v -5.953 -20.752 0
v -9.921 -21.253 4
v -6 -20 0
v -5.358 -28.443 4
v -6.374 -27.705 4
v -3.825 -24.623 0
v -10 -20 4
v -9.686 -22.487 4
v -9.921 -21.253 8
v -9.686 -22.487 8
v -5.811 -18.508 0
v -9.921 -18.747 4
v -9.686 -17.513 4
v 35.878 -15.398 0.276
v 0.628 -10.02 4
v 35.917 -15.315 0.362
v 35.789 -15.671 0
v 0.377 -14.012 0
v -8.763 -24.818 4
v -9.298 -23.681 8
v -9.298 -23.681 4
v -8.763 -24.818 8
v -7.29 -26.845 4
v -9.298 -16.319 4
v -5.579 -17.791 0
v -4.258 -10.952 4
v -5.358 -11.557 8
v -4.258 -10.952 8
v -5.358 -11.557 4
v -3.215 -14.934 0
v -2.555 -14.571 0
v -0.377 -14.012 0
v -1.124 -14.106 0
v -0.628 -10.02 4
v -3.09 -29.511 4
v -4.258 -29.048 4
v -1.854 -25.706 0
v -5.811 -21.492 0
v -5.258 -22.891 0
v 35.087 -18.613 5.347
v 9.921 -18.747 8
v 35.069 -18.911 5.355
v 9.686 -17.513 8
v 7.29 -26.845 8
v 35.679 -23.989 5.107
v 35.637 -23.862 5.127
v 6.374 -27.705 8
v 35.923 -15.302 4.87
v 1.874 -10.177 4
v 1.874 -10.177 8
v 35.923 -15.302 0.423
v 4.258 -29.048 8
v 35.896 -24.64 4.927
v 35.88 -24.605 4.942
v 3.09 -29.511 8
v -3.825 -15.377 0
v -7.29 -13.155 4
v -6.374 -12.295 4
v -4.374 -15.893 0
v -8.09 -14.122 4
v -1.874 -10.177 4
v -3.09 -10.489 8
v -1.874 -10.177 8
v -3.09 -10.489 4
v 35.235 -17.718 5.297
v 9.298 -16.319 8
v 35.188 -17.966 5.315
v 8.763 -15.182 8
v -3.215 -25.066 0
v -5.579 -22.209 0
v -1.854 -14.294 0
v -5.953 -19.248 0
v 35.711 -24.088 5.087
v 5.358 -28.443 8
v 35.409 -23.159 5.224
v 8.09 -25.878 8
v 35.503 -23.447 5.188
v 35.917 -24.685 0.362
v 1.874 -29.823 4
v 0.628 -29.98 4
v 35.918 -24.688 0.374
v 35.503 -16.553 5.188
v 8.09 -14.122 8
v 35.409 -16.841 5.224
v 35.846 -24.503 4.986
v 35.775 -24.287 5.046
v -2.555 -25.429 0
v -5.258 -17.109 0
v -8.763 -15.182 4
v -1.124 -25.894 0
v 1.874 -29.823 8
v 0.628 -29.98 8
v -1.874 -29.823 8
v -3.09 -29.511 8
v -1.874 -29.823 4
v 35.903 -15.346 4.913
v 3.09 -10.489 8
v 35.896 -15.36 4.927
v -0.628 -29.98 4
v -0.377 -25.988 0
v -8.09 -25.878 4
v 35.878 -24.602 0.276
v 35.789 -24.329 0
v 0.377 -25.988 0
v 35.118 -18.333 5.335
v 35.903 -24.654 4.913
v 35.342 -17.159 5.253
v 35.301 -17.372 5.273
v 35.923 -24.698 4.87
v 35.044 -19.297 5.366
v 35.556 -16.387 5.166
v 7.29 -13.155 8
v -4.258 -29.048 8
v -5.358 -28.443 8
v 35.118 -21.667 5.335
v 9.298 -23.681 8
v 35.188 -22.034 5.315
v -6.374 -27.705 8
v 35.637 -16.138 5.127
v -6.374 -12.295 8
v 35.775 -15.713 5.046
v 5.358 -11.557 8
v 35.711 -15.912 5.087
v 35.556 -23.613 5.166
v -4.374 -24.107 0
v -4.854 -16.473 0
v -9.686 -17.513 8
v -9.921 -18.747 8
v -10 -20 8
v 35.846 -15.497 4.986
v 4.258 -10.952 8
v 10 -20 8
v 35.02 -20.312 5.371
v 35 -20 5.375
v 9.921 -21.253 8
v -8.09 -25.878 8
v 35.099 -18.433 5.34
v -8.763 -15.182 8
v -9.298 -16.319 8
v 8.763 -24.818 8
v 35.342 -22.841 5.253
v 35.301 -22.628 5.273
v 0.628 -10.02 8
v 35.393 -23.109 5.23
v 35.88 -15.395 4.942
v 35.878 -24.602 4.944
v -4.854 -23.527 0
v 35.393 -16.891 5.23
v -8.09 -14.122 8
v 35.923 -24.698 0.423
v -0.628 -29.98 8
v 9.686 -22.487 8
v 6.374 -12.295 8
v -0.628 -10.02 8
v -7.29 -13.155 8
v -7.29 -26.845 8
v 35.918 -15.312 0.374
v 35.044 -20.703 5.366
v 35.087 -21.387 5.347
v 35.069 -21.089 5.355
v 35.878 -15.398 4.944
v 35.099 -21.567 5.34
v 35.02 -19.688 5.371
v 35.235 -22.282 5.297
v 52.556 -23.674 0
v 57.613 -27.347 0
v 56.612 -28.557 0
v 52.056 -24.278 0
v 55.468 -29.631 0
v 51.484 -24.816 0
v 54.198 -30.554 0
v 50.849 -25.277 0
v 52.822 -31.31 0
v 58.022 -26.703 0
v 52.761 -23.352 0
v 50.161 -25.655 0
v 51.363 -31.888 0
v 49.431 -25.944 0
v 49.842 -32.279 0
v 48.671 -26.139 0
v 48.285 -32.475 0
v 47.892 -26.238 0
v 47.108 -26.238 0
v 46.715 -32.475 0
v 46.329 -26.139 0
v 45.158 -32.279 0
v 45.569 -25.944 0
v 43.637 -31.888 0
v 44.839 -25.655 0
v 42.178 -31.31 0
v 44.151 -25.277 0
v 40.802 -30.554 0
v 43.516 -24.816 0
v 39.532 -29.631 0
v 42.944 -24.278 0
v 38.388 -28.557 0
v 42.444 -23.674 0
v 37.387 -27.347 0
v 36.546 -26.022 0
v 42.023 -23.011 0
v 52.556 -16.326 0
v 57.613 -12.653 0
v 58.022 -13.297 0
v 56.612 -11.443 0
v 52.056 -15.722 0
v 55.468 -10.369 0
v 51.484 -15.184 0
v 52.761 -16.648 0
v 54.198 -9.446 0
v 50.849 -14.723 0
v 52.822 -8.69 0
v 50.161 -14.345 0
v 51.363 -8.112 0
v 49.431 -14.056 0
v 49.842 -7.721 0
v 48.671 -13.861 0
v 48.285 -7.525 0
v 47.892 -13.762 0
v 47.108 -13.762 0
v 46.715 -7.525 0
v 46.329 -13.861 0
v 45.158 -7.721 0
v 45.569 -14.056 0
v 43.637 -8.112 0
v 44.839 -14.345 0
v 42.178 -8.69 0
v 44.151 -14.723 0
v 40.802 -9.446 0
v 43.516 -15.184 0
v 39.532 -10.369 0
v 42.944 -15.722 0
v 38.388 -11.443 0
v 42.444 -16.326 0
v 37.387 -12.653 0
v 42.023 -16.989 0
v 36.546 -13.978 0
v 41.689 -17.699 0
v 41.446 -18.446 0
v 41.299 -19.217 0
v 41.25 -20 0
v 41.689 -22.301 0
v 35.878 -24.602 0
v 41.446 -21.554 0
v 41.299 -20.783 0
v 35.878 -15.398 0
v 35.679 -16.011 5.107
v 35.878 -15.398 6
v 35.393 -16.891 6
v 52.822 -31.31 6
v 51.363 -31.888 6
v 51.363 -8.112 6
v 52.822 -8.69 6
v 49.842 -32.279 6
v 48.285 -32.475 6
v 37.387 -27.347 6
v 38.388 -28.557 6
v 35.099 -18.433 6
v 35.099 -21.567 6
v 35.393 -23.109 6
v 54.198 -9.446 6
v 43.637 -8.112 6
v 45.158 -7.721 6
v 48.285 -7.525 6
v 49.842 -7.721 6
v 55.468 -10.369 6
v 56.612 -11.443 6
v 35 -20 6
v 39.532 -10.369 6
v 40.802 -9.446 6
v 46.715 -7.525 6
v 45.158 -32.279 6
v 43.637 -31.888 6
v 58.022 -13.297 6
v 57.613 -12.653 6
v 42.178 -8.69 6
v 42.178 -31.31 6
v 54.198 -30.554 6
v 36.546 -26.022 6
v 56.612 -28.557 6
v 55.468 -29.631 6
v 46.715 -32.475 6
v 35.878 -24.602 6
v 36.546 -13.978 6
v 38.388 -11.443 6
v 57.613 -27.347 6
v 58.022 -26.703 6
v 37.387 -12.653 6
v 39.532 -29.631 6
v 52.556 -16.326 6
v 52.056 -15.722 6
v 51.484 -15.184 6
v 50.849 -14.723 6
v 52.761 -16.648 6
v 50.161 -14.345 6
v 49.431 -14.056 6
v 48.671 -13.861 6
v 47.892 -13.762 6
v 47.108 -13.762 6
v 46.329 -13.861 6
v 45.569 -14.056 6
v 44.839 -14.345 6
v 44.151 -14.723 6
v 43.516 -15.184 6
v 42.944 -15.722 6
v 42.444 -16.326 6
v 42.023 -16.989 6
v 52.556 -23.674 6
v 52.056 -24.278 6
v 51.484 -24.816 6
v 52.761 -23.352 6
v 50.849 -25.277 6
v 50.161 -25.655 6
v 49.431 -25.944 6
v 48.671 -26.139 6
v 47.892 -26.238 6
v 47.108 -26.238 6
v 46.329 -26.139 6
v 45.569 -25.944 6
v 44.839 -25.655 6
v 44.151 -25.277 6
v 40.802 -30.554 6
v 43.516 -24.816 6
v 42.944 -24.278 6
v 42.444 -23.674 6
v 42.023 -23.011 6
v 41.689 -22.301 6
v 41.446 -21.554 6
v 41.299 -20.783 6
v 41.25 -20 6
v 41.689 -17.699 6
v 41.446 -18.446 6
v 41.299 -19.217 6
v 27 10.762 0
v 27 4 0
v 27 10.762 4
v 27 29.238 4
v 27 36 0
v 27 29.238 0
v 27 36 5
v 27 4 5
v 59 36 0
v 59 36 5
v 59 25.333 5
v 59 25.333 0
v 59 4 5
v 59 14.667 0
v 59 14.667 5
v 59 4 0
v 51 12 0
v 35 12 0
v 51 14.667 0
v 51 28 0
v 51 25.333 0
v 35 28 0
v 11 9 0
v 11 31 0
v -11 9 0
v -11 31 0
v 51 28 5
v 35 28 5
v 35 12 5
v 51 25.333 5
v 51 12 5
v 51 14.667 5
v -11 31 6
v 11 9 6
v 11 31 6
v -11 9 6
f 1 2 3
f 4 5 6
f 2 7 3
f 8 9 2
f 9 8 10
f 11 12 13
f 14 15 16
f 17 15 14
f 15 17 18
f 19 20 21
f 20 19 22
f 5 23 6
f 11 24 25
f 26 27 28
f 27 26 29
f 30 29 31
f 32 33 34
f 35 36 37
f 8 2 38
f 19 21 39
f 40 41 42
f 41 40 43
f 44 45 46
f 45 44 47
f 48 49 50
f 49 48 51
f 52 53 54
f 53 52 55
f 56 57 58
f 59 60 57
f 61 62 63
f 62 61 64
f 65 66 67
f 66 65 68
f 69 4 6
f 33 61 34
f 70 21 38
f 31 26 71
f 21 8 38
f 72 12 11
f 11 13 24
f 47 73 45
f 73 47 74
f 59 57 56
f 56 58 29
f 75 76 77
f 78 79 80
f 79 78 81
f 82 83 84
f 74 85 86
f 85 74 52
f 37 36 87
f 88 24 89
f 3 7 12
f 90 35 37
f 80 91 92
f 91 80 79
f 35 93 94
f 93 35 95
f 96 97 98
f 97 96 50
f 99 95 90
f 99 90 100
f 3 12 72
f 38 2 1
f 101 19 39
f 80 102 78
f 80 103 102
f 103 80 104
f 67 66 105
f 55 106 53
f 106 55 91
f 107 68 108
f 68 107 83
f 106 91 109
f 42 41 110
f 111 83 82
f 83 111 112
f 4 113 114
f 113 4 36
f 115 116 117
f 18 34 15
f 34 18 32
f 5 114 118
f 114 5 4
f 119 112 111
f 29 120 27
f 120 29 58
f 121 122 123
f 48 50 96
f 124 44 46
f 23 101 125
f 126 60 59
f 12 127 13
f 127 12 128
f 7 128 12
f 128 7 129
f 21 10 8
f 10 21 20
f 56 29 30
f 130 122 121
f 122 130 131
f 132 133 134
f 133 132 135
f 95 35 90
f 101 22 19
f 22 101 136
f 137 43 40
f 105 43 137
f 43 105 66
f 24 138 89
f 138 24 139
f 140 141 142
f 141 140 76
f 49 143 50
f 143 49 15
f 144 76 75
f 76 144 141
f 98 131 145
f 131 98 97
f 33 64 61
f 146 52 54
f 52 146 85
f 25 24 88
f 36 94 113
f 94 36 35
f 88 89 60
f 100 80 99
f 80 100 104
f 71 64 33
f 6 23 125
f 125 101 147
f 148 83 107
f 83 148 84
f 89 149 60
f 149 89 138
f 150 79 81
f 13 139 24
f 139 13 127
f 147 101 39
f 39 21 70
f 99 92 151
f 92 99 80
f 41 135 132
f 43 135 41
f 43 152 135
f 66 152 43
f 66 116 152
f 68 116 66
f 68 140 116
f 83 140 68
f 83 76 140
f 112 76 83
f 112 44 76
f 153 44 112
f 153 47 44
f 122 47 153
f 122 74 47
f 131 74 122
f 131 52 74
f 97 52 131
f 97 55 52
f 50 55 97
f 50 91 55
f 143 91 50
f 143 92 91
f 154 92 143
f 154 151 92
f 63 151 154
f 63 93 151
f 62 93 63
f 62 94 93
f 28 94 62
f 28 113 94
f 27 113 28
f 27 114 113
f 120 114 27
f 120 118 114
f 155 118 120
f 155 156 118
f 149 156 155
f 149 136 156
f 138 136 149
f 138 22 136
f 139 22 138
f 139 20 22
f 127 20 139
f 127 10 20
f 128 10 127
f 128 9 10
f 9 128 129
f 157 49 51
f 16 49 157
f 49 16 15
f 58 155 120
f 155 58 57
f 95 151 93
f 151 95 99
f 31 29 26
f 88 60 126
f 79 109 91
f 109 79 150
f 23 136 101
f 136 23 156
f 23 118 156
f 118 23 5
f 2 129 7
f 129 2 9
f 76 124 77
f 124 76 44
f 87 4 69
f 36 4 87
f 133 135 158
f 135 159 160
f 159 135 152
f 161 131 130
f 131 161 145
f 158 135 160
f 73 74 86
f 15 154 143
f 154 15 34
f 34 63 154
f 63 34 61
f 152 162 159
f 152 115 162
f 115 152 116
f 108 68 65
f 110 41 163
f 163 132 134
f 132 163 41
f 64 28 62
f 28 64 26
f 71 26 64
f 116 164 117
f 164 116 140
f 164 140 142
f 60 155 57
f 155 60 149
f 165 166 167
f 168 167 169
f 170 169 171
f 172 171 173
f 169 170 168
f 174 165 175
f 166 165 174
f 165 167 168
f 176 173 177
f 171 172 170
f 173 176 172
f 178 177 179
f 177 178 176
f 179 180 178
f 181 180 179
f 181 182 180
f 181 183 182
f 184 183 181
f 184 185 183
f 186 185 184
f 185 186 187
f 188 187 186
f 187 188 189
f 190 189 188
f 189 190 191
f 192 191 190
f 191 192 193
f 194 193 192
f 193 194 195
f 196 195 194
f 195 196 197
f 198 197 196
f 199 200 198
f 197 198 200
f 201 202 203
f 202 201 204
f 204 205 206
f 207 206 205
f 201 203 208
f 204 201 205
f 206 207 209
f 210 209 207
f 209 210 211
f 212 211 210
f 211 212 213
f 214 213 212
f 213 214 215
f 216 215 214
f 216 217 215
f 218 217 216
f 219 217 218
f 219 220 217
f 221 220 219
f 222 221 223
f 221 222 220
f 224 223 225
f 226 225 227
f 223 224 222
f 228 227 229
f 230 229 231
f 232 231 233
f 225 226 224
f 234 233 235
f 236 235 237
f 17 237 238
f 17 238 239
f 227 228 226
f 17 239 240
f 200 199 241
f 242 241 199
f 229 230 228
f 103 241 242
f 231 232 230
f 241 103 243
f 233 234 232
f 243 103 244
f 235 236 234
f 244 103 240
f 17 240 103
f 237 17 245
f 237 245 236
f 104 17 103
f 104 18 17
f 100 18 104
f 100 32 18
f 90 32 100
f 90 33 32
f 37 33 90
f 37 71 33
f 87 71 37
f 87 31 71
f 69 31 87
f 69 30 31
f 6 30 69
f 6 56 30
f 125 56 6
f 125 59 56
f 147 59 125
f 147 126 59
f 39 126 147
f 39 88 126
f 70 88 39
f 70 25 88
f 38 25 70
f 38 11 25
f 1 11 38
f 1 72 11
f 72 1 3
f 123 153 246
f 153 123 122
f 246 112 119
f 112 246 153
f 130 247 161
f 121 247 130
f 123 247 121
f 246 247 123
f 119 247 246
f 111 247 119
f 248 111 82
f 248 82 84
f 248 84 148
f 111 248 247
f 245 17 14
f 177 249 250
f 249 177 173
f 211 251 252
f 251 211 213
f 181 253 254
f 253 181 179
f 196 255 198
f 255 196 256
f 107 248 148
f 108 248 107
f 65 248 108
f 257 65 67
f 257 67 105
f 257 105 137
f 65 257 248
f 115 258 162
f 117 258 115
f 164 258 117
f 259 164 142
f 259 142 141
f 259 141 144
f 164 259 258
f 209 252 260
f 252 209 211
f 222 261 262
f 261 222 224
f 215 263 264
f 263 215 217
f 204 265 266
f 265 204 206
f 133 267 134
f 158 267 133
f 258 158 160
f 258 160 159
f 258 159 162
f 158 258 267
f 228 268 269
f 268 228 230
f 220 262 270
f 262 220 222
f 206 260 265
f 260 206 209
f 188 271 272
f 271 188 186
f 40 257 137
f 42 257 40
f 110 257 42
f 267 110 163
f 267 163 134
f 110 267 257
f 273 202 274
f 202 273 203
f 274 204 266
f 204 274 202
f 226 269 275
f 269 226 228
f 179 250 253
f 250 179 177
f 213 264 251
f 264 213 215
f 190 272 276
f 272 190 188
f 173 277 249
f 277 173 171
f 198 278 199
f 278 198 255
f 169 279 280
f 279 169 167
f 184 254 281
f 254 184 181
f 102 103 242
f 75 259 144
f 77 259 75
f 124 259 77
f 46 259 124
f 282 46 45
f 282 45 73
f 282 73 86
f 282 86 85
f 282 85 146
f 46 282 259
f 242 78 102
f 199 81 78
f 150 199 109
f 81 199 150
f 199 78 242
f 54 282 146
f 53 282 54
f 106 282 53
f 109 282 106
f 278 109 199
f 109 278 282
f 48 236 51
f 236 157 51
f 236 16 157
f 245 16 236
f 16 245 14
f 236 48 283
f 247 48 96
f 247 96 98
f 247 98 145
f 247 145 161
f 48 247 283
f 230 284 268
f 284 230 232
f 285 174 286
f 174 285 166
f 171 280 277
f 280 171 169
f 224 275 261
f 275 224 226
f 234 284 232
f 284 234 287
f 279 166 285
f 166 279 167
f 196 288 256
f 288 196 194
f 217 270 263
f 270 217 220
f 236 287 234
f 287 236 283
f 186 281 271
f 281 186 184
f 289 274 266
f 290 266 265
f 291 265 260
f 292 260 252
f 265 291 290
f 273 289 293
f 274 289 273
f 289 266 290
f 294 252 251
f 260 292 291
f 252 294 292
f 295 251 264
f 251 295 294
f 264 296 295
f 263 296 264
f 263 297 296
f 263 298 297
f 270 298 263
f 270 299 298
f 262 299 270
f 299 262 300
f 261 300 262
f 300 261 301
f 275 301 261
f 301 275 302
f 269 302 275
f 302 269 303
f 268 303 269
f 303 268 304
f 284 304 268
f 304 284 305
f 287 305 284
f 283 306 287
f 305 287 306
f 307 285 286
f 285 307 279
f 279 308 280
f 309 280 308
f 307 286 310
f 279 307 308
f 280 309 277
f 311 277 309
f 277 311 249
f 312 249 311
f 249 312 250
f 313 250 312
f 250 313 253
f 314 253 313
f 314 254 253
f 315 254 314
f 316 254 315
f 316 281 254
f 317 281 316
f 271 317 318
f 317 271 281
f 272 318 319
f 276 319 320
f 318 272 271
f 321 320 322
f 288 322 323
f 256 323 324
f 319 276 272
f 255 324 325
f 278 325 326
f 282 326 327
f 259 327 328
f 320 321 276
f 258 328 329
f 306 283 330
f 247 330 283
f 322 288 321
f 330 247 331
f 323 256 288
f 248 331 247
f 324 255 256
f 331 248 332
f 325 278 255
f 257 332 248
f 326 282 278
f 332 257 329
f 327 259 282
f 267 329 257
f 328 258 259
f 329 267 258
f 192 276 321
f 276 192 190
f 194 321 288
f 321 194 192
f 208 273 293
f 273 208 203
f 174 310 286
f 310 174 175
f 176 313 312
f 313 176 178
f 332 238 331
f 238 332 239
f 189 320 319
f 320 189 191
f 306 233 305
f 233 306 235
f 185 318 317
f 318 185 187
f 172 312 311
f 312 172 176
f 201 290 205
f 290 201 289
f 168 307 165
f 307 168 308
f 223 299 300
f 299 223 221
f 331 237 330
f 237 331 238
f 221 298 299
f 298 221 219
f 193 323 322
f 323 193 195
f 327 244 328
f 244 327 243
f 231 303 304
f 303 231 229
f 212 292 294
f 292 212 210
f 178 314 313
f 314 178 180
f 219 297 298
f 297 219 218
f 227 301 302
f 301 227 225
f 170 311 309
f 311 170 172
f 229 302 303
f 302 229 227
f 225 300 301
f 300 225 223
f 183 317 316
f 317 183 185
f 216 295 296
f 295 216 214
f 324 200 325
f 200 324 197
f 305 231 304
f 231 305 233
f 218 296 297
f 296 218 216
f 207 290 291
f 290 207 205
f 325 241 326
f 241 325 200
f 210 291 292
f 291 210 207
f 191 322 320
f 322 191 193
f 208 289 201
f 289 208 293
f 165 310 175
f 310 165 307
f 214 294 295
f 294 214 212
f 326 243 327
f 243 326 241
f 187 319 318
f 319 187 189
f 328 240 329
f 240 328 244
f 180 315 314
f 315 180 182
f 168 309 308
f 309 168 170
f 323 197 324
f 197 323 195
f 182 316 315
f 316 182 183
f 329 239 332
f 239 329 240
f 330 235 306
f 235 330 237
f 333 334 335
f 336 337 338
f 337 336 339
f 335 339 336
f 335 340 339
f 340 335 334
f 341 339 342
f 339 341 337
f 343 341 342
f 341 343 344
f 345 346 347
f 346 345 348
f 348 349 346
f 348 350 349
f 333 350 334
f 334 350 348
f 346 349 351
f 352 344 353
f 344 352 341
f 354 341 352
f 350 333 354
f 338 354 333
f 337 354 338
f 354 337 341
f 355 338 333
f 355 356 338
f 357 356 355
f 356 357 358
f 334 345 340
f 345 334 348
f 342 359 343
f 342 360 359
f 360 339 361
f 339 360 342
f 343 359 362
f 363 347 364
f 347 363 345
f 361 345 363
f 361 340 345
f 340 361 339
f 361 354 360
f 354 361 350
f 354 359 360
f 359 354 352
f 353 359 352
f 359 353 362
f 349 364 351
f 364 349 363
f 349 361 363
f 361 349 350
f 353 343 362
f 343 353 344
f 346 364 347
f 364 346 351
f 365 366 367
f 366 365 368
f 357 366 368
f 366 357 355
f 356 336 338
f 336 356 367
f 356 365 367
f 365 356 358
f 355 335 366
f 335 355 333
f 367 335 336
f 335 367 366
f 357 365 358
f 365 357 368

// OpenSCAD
// file: ../utilities/transformations_oblomobka.scad
// Transformations
// (C) @oblomobka - 2014
// GPL3

// Transforma una forma en un sector según un ángulo dado.

module sector(	angle, 	// es el ángulo del sector, lo que quedará de la forma original
				d,		// valor auxiliar, será como mínimo igual al diámetro del cilindro que envuelve la forma original
				h		// valor auxiliar, será como mínimo igual a la altura del cilindro que envuelve la forma original
				){

POINTS=[	[0,0,-h],
		[0,0,h],
		[d*cos(0*angle/4),d*sin(0*angle/4),-h],
		[d*cos(0*angle/4),d*sin(0*angle/4),h],
		[d*cos(1*angle/4),d*sin(1*angle/4),-h],
		[d*cos(1*angle/4),d*sin(1*angle/4),h],
		[d*cos(2*angle/4),d*sin(2*angle/4),-h],
		[d*cos(2*angle/4),d*sin(2*angle/4),h],
		[d*cos(3*angle/4),d*sin(3*angle/4),-h],
		[d*cos(3*angle/4),d*sin(3*angle/4),h],
		[d*cos(4*angle/4),d*sin(4*angle/4),-h],
		[d*cos(4*angle/4),d*sin(4*angle/4),h],
		];

TRIANGLES=[	[0,1,2],
			[1,3,2],
			[2,3,4],
			[3,5,4],
			[4,5,6],
			[5,7,6],
			[6,7,8],
			[7,9,8],
			[8,9,10],
			[9,11,10],
			[10,11,0],
			[11,1,0],

			[5,3,1],
			[7,5,1],
			[9,7,1],
			[11,9,1],
			[0,2,4],
			[0,4,6],
			[0,6,8],
			[0,8,10]
			];

if(angle<=0 || angle>=360){
	child();
	}
	else{
		intersection(){
			polyhedron(points=POINTS,triangles=TRIANGLES);
			child();
			}
		}
}

//sector (150,40,10)cylinder(r=20,h=10); // Ejemplo de uso de la tansformación sector()
// file: ../utilities/functions_ext.scad
// Funciones sacadas de otras librerías y de diferentes autores

include <constants_oblomobka.scad>

/* A circular helix of radius a and pitch 2πb is described by the following parametrisation:
x(t) = a*cos(t),
y(t) = a*sin(t),
z(t) = b*t
Licensed under the MIT license.
© 2010 by Elmo Mäntynen
*/
function b(pitch) = pitch/(TAU);
function t(pitch, z) = z/b(pitch);
function helix_curve(pitch, radius, z) = [radius*cos(deg(t(pitch, z))), radius*sin(deg(t(pitch, z))), z];


/* Utility functions.
 * Originally by Hans Häggström, 2010.
 * Dual licenced under Creative Commons Attribution-Share Alike 3.0 and LGPL2 or later
 */
function distance(a, b) = sqrt( (a[0] - b[0])*(a[0] - b[0]) +
                                (a[1] - b[1])*(a[1] - b[1]) +
                                (a[2] - b[2])*(a[2] - b[2]) );

function length2(a) = sqrt( a[0]*a[0] + a[1]*a[1] );

function normalized(a) = a / (max(distance([0,0,0], a), 0.00001));

function normalized_axis(a) = 	a == "x" ? [1, 0, 0]:
                  			 	a == "y" ? [0, 1, 0]:
                   				a == "z" ? [0, 0, 1]: normalized(a);

function angleOfNormalizedVector(n) = [0, -atan2(n[2], length2([n[0], n[1]])), atan2(n[1], n[0]) ];

function angle(v) = angleOfNormalizedVector(normalized(v));

function angleBetweenTwoPoints(a, b) = angle(normalized(b-a));
// file: ../utilities/constants_oblomobka.scad
// números transcendentes

TAU = 2*PI; //6.2831853071 (PI ya está definido en Openscad)
EULER=2.71828282;


// números algebraicos

PHI=(1+sqrt(5))/2;


// Vectores

X = [1, 0, 0];
Y = [0, 1, 0];
Z = [0, 0, 1];
// file: ../utilities/shapes_oblomobka.scad
// Shapes
// (C) @oblomobka - 2014
// GPL3

include <constants_oblomobka.scad>
include <functions_oblomobka.scad>
include <functions_ext.scad>

use <transformations_oblomobka.scad>

// --- Piramide con base circunscrita en un círculo definido en las variables
module pyramid_circumscribed (	n=4,			// nº lados de la base de la pirámide	
								d1=20,		// diámetro del círculo-base donde se circunscribe la pirámide
								d2=0,		// diámetro del círculo-punta donde se circunscribe la pirámide
								h=10			// altura de la pirámide
								){

if(n%2==0){
	rotate([0,0,180/n])
		cylinder (r1=d1/2/cos(180/n), r2=d2/2/cos(180/n), h=h, $fn=n);
	}
	else{
		rotate([0,0,90/n])
			cylinder (r1=d1/2/cos(180/n), r2=d2/2/cos(180/n), h=h, $fn=n);
		}

}
// ------- pyramid_circumscribed (n=n,d1=d1,d2=d2,h=h); -----------------

// --- Prisma con base circunscrita en un círculo definido en las variables
module prism_circumscribed (	n=4,			// nº lados de la base del prisma
							d=20,		// diámetro del círculo donde se circunscribe el prisma
							h=10			// altura del prisma
							){
if(n%2==0){
	rotate([0,0,180/n])
		cylinder (r=d/2/cos(180/n), h=h, $fn=n);
	}
	else{
		rotate([0,0,90/n])
			cylinder (r=d/2/cos(180/n), h=h, $fn=n);
		}
}
// ------- prism_circumscribed (n=n,d=d,h=h); -----------------



// Toros

// Definido por el diámetro exterior y el diámetro del círculo en revolución
module torusOD (d1,d2,resolution){
$fn=resolution;	
rotate_extrude(){
	translate([d1/2-d2/2,0,0])
		circle(r=d2/2);
	}
}

// Definido por el diámetro exterior y el diámetro interior
module torusOI (d1,d2,resolution){
$fn=resolution;	
d=(d1-d2)/2;
rotate_extrude(){
	translate([d1/2-d/2,0,0])
		circle(r=d/2);
	}
}

// Definido por el diámetro de la línea neutra y el diámetro del círculo en revolución
module torusND (d1,d2,resolution){
$fn=resolution;	
rotate_extrude(){
	translate([d1/2,0,0])
		circle(r=d2/2);
	}
}

module torus_sector(d1,d2,angle=360,mode=1,extreme=true,resolution=32){

if(angle<=0 || angle>=360){
	if(mode==1){torusOD(d1,d2,resolution=resolution);}
	else{if(mode==2){torusND(d1,d2,resolution=resolution);}
	else{if(mode==3){torusOI(d1,d2,resolution=resolution);}}}
	}

else{
	if(mode==1){
		union(){
			sector(angle,d1,d2/2)torusOD(d1,d2,resolution=resolution);
			if(extreme==true){
				translate([d1/2-d2/2,0,0])sphere(d2/2,$fn=resolution);
				translate([(d1/2-d2/2)*cos(angle),(d1/2-d2/2)*sin(angle),0])sphere(d2/2,$fn=resolution);
				}
			}
		}
	else{
		if(mode==2){
			union(){
				sector(angle,d1+d2,d2/2)torusND(d1,d2,resolution=resolution);
				if(extreme==true){
					translate([d1/2,0,0])sphere(d2/2,$fn=resolution);
					translate([d1/2*cos(angle),d1/2*sin(angle),0])sphere(d2/2,$fn=resolution);
					}
				}
			}
		else{
			if(mode==3){
				union(){
					sector(angle,d1,(d1-d2)/4)torusOI(d1,d2,resolution=resolution);
					if(extreme==true){
						translate([d1/2-(d1-d2)/4,0,0])sphere((d1-d2)/4,$fn=resolution);
						translate([(d1/2-(d1-d2)/4)*cos(angle),(d1/2-(d1-d2)/4)*sin(angle),0])sphere((d1-d2)/4,$fn=resolution);
						}
					}
				}
			}
		}
	}
}


// Tubos

module tubeOT (d,t,h,resolution=resolution){	
	difference(){
		cylinder(r=d/2,h=h,$fn=resolution);
		cylinder(r=(d-2*t)/2,h=3*h,center=true,$fn=resolution);
		}
}

// Definido por el diámetro exterior y el diámetro interior
module tubeOI (d1,d2,h,resolution=resolution){
	difference(){
		cylinder(r=d1/2,h=h,$fn=resolution);
		cylinder(r=d2/2,h=3*h,center=true,$fn=resolution);	
		}
}

// Definido por el diámetro de la línea neutra y el diámetro del círculo en revolución
module tubeNT (d,t,h,resolution=resolution){
	difference(){
		cylinder(r=(d+t)/2,h=h,$fn=resolution);
		cylinder(r=(d-t)/2,h=3*h,center=true,$fn=resolution);
	}
}

module tube_sector(d=25,t=2,h=1,angle=360,mode=1,extreme=true,resolution=32){

if(angle<=0 || angle>=360){
	if(mode==1){tubeOT(d,t,h,resolution=resolution);}
	else{if(mode==2){tubeNT(d,t,h,resolution=resolution);}
	else{if(mode==3){tubeOI(d,t,h,resolution=resolution);}}}
	}

else{
	if(mode==1){
		union(){
			sector(angle,d,h)tubeOT(d,t,h,resolution=resolution);
			if(extreme==true){
				translate([d/2-t/2,0,0])cylinder(r=t/2,h=h,$fn=resolution);
				translate([(d/2-t/2)*cos(angle),(d/2-t/2)*sin(angle),0])cylinder(r=t/2,h=h,$fn=resolution);;
				}
			}
		}
	else{
		if(mode==2){
			union(){
				sector(angle,d+t,h)tubeNT(d,t,h,resolution=resolution);
				if(extreme==true){
					translate([d/2,0,0])cylinder(r=t/2,h=h,$fn=resolution);
					translate([d/2*cos(angle),d/2*sin(angle),0])cylinder(r=t/2,h=h,$fn=resolution);
					}
				}
			}
		else{
			if(mode==3){
				union(){
					sector(angle,d,h)tubeOI(d,t,h,resolution=resolution);
					if(extreme==true){
						translate([d/2-(d-t)/4,0,0])cylinder(r=(d-t)/4,h=h,$fn=resolution);
						translate([(d/2-(d-t)/4)*cos(angle),(d/2-(d-t)/4)*sin(angle),0])cylinder(r=(d-t)/4,h=h,$fn=resolution);
						}
					}
				}
			}
		}
	}
}

//torus_sector(d1=15,d2=4,angle=215,mode=3,extreme=true,resolution=50);
//tube_sector(d=24,t=11,h=15,angle=250,mode=1,extreme=true,resolution=50);

pyramid_circumscribed(n=10,d=8,h=4);
// file: ../utilities/functions_oblomobka.scad
// Functions
// (C) @oblomobka - 2014
// GPL3

include <constants_oblomobka.scad>

// da el diámetro interior del cono(d1,d2,h) a una altura interior(hi) conocida
function di_cone(d1,d2,h,hi)=d2+(d1-d2)*(1-hi/h);

// da la altura interior del cono(d1,d2,h) a un diametro(di) conocido
function hi_cone(d1,d2,h,di)=-h*((di-d2)/(d1-d2)-1);

// 
function r_circle_intersection (d1,d2)=sqrt(pow(d1/2,2)-pow(d2/2,2));

// Relaciones entre radio, apotema y lado en un polígono de n lados
function side_apothem (apothem,n)=apothem*2*tan(180/n);
function apothem_radius(radius,n)=radius*cos(180/n);
function radius_apothem(apothem,n)=apothem/cos(180/n);
function side_radius (radius,n)=radius*2*sin(180/n);

// limita los posibles valores de x, que siempre estarán comprendidos entre un minimo(a) y un maximo(z)
function lim(a,x,z)=max(a,min(x,z));

// transforma angulo, radianes --> hexadecimal
function deg(angle) = 180*angle/PI;
// transforma angulo, hexadecimal --> radianes
function rad(angle) = angle*PI/180;
// file: ../utilities/limits_oblobots.scad
//PIN
	d_pin_minmax=[10,30];			//	d_pin=lim(d_pin_minmax[0],pin[0],d_pin_minmax[1]);			
	h_pin_minmax=[0,10];			//	h_pin=lim(h_pin_minmax[0],pin[1],h_pin_minmax[1]);

//LEGS & FOOTS
	d_leg_minmax=[10,30];			//	d_leg=lim(d_leg_minmax[0],leg[0],d_leg_minmax[1]);
	h_leg_minmax=[20,90];			//	h_leg=lim(h_leg_minmax[0],leg[1],h_leg_minmax[1]);	
	n_leg_minmax=[4,16];			//	n_leg=lim(n_leg_minmax[0],leg[2],n_leg_minmax[1]);
	legsposition_minmax=[0,100];	// 	legsposition=lim(legsposition_minmax[0],leg[1],legsposition_minmax[1]);

	l_foot_minmax=[24,70];		//	l_foot=lim(l_foot_minmax[0],foot[0],l_foot_minmax[1]);
	h_foot_minmax=[0,40];			//	h_foot=lim(h_foot_minmax[0],foot[1],h_foot_minmax[1]);

//HIP | WAIST
	//C
	d_hip_minmax=[25,80];			//	d_hip=lim(d_hip_minmax[0],hip[0],d_hip_minmax[1]);
	h_hip_minmax=[10,70];			//	h_hip=lim(h_pin+2,hip[1],h_hip_minmax[1]);
	f_hip_minmax=[0,100];			//	f_hip=lim(f_hip_minmax[0],hip[2],f_hip_minmax[1]);

								//	d1_waist=lim(d_pin,waist[0],d_hip);
								//	d2_waist=lim(d_pin,waist[1],d1_waist);
	h_waist_minmax=[0.3,20];		//	h_waist=lim(h_waist_minmax[0],waist[2],h_waist_minmax[1]);

	
	//Q
	x_hip_minmax=[20,90];			//	x_hip=lim(x_hip_minmax[0],hip[0],x_hip_minmax[1]);
	y_hip_minmax=[20,60];			//	y_hip=lim(y_hip_minmax[0],hip[1],y_hip_minmax[1]);
	z_hip_minmax=[10,60];			//	z_hip=lim(z_hip_minmax[0],hip[2],z_hip_minmax[1]);
	bevel_hip_minmax=[0.5,20];	//	bevel_hip=lim(bevel_hip_minmax[0],hip[3],bevel_hip_minmax[1]);

	n_waist_minmax=[4,50];		//	n_waist=lim(n_waist_minmax[0],waist[3],n_waist_minmax[1]);
								//	d1_waist=lim(d_pin,waist[0],min(x_hip,y_hip));
								//	d2_waist=lim(d_pin,waist[1],d1_waist);


//TRUNK | SHOULDER | NECK
	//C
	d1_trunk_minmax=[30,100];		//	d1_trunk=lim(d1_trunk_minmax[0],trunk[0],d1_trunk_minmax[1]); 
	d2_trunk_minmax=[30,100];		//	d2_trunk=lim(d2_trunk_minmax[0],trunk[1],d1_trunk);
	h_trunk_minmax=[24,100];		//	h_trunk=lim(h_trunk_minmax[0],trunk[2],h_trunk_minmax[1]);

	d1_shoulder_minmax=[12,50];	//	d1_shoulder=lim(d1_shoulder_minmax[0],shoulder[0],h_trunk*sin(angle_trunk));
	d_aux_shoulder_minmax=[0,10];	//	d_aux_shoulder=lim(d_aux_shoulder_minmax[0],shoulder[1],d_aux_shoulder_minmax[1]);
	h_shoulder_minmax=[0,50];		//	h_shoulder=lim(h_shoulder_minmax[0],shoulder[2],d2_trunk/2);

								//	d1_neck=lim(d_pin+2,neck[0],d2_trunk);
								//	d2_neck=lim(d_pin+2,neck[1],d1_neck);
	h_neck_minmax=[0.3,20];		//	h_neck=lim(h_neck_minmax[0],neck[2],h_neck_minmax[1]);

	//Q
	x_trunk_minmax=[20,90];		//	x_trunk=lim(x_trunk_minmax[0],trunk[0],x_trunk_minmax[1]);
	y_trunk_minmax=[20,90];		//	y_trunk=lim(d_pin+1+x_trunk/5,trunk[1],y_trunk_minmax[1]);
	z_trunk_minmax=[26,90];		//	z_trunk=lim(z_trunk_minmax[0],trunk[2],z_trunk_minmax[1]);
	
	n_neck_minmax=[4,50];			//	n_neck=lim(n_neck_minmax[0],neck[3],n_neck_minmax[1]);
								//	d1_neck=lim(d_pin+2,neck[0],min(x_trunk,y_trunk));	
								//	d2_neck=lim(d_pin+2,neck[1],d1_neck);

	//ELECTRIC TRUNK
	d_polygonal_trunk_minmax=[45,80];	//d_polygonal_trunk=lim(d_polygonal_trunk_minmax[0],trunk[0],d_polygonal_trunk_minmax[1]);							
	h_polygonal_trunk_minmax=[87,120];	//h_polygonal_trunk=lim(h_polygonal_trunk_minmax[0],trunk[1],h_polygonal_trunk_minmax[1]);
	thickness_trunk_minmax=[1,6];	//thickness_trunk=lim(thickness_trunk_minmax[0],trunk[2],thickness_trunk_minmax[1]);

// ARMS | HANDS
	// C
	d_arm_minmax=[10,40];			// 	d_arm=lim(d_arm_minmax[0],arm[0],d_arm_minmax[1]);
								//	d_arm=lim(d_pin+1,arm[0],d_arm_minmax[1]);	
	h_arm_minmax=[5,25];			// 	h_arm=lim(h_arm_minmax[0],arm[1],h_arm_minmax[1]);
	armpit_minmax=[0.3,60];		//	armpit=lim(armpit_minmax[0],arm[2],armpit_minmax[1]);
	l_arm_minmax=[20,120];		// 	l_arm=lim(d_arm+d_hand,arm[2],l_arm_minmax[1]);	

	d_hand_minmax=[10,60];		//	d_hand=lim(d_hand_minmax[0],hand[0],d_hand_minmax[1]);
	h_hand_minmax=[3,25];			//	h_hand=lim(h_hand_minmax[0],hand[1],h_arm-0.5);
	angle_hand_minmax=[0,180];	//	angle_hand=lim(angle_hand_minmax[0],hand[2]/2,angle_hand_minmax[1]);

	// Q
	x_arm_minmax=[5,25];			// 	x_arm=lim(x_arm_minmax[0],arm[1],x_arm_minmax[1]);
	y_arm_minmax=[10,40];			// 	y_arm=lim(y_arm_minmax[0],arm[0],y_arm_minmax[1]);
	z_arm_minmax=[20,120];		//	z_arm=lim(y_arm+5+d_hand,arm[2],z_arm_minmax[1]);

	n_hand_minmax=[4,12];			// 	n_hand=lim(n_hand_minmax[0],2*floor(hand[2]/2),n_hand_minmax[1]);
								//	h_hand=lim(h_hand_minmax[0],hand[1],x_arm-0.5);

// HEAD | EYES | BRAIN
	// C
	h_head_minmax=[20,100];		// 	h_head=lim(h_head_minmax[0],head[2],h_head_minmax[1]);
	d1_head_minmax=[20,60];		// 	d1_head=lim(h_head_minmax[0],head[0],h_head_minmax[1]);
	d2_head_minmax=[15,150];		// 	d2_head=lim(h_head_minmax[0],head[1],2*h_head+d1_head);

	// Q
	x_head_minmax=[20,100];		// x_head=lim(x_head_minmax[0],head[0],x_head_minmax[1]);
	y_head_minmax=[20,100];		// y_head=lim(y_head_minmax[0],head[1],y_head_minmax[1]);
	z_head_minmax=[20,100];		// z_head=lim(z_head_minmax[0],head[2],z_head_minmax[1]);

	d_eye_minmax=[5,40];			// 	d_eye=lim(d_eye_minmax[0],eye[0],(d1_head+d2_head)/2);
	h_eye_minmax=[1,10];			// 	h_eye=lim(h_eye_minmax[0],eye[1],h_eye_minmax[1]);
	edge_eye_minmax=[1,12];		//	edge_eye=lim(edge_eye_minmax[0],eye[2],d_eye/2-3);

	frown_eye_expression_minmax=[0,100];		// frown_eye_expression=lim(frown_eye_expression_minmax[0],eye_expression[1],frown_eye_expression_minmax[1]);
	bridge_eye_position_minmax=[0,100];		// bridge_eye_position=lim(bridge_eye_position_minmax[0],eye_position[0],bridge_eye_position_minmax[1]);	
	f_h_eye_position_minmax=[0,100];			// f_h_eye_position=lim(f_h_eye_position_minmax[0],eye_position[1],f_h_eye_position_minmax[1]);	

	h_brain_minmax=[0,40];			//	h_brain=lim(h_brain_minmax[0],brain[0],h_brain_minmax[1]);
	edge_brain_minmax=[0,25];			//	edge_brain=lim(edge_brain_minmax[0],brain[1],edge_brain_minmax[1]);

//BADGE
	d_badge_minmax=[20,40];		//	d_badge=lim(d_badge_minmax[0],badge[0],d_badge_minmax[1])
	h_badge_minmax=[0.5,5];		// 	h_badge=lim(h_badge_minmax[0],badge[1],h_badge_minmax[1]);
	n_badge_minmax=[4,50];		// 	n_badge=lim(n_badge_minmax[0],badge[3],n_badge_minmax[1]);
	edge_badge_minmax=[1,5];		//	edge_badge=lim(edge_badge_minmax[0],badge[2],edge_badge_minmax[1]);
// file: ../utilities/presets_oblobots.scad
//////////////////////////////////////////////////////////////////////////////////////////////////
// presets [OBLOBOTS] 
// valores predeterminados para los volúmenes de un oblobot así como de los modos de represntación
//////////////////////////////////////////////////////////////////////////////////////////////////
// (c) Jorge Medal (@oblomobka) - Sara Alvarellos (@trecedejunio) Oct 2013
//////////////////////////////////////////////////////////////////////////////////////////////////
// GPL license
//////////////////////////////////////////////////////////////////////////////////////////////////

use <functions_oblomobka.scad>


//-- CARACTERÍSTICAS DEL PIN

SIMPLE=[0,0,0];					// cilindro 

	// Pestañas en pin con punta expandible
	tab_expansion=80;
	TABWIDE=[35,35,tab_expansion];
	TABNORMAL=[50,50,tab_expansion];
	TABFINE=[65,65,tab_expansion];

/////////////////////////////////////////////
/////// REPRESENTACIÓN //////////////////////
/////////////////////////////////////////////

//-- MODOS DE REPRESENTACIÓN DE LAS PARTES 

ASSEMBLED=[0,1,0,0];
EXPLOSION=[0,1,1,1];
PRINTING=[1,0,0,2];


//-- ELECCIÓN DE LA PARTE REPRESENTADA	

ALL=[0];
LEGS=[1];
HIP=[2];
TRUNK=[3];
HEAD=[4];
ARMS=[5];
BADGES=[6];

//-- COLORES

arms_color=[1,rands(100,200,1)[0]/255,0];
legs_color=[0,rands(100,200,1)[0]/255,1];
trunk_color=[rands(0,100,1)[0]/255,rands(150,225,1)[0]/255,rands(0,100,1)[0]/255];
head_color=[220/255,rands(0,100,1)[0]/255,20/255];
badges_color=[rands(0,255,1)[0]/255,rands(0,255,1)[0]/255,rands(0,255,1)[0]/255];
hip_color=[0,(rands(100,200,1)[0])/255,1];
// file: ../utilities/external_elements_oblobots.scad
//////////////////////////////////////////////////////////////////////////////////////////////////
// external elements [OBLOBOTS] 
// librería de elementos externos comerciales (botones automáticos, espigas de madera baterías, ...) 
// que se usan en las partes de los oblobots
//////////////////////////////////////////////////////////////////////////////////////////////////
// (c) Jorge Medal (@oblomobka) - Sara Alvarellos (@trecedejunio) 2014-02
//////////////////////////////////////////////////////////////////////////////////////////////////
// GPL license
//////////////////////////////////////////////////////////////////////////////////////////////////

//-- BOTONES AUTOMÁTICOS - Press Fastener (PF)
//-- Cada código corresponde a las medidas de un modelo concreto

//XXX= [ xx,xx,xx,xx,xx,xx,xx ];		// [ 	diametro hembra,
									//		espesor hembra,
									//		diámetro alojamiento en hembra (aparece en los botones para coser),
									//		saliente del alojamiento en hembra (aparece en los botones para coser),
									//		diámetro macho,
									//		espesor macho	
									//		tipo]

NULL=[0,0,0,0,0,0,0];				// no hay botón automático 
//PON = [11.7,2.35,0,0,11.7,1.6 ];	// marca desconocida, encontrado en Pontejos (Madrid)
//PRYM10 = [11,2.2,0,0,11,2.0];		// marca PRYM - 10 mm
PRYM_SNAP_FASTENERS_11 = [10.1,1.4,3.5,3,9.1,1,2];	// marca PRYM - Snap fasteners 11mm
PRYM_SNAP_FASTENERS_9 = [8.5,1.5,3,2.7,8.1,1,2];	// marca PRYM - Snap fasteners 9mm

fit_male=0.7;

//-- Espigas de madera - DOWEL

DOWEL_8=[8,40,0,0,0,0,1];
DOWEL_6=[6,30,0,0,0,0,1];

//-- TUBOS DE PLÁSTICO

PIPE_6=[6,20,0,0,0,0,1];



//-- BATERÍAS CILÍNDRICAS

//XX= [ xx,xx ];		// [ 	diametro de la pila,
					//		longitud	de la pila	]

AA = [ 14.5, 50.5 ];
AAA = [ 10.5,44.5 ];
C = [ 26.2, 50 ];
D = [ 34.2, 61.5 ]; 
// main file
///////////////////////////////////////////////////////////////////////////////////////////////
// arm[OBLOBOTS] 
// pre-form
//////////////////////////////////////////////////////////////////////////////////////////////////
// (c) Jorge Medal (@oblomobka) - Sara Alvarellos (@trecedejunio) 2014-04 - v.10
//////////////////////////////////////////////////////////////////////////////////////////////////
// GPL license
//////////////////////////////////////////////////////////////////////////////////////////////////

include <../utilities/external_elements_oblobots.scad>
include <../utilities/presets_oblobots.scad>
include <../utilities/limits_oblobots.scad>

use <../utilities/functions_oblomobka.scad>
use <../utilities/shapes_oblomobka.scad>

//////////////////////////////////////////////////////////////////
///////////// MODULO arm_cylindrical()  //////////////////////////

module arm_cylindrical (	arm=[18,6,45],		// [d,h,l]
						hand=[27,4,120]		// [d,h,ang]
						){

// valores con límites: acotados entre un máximo y un mínimo (los valores límite están en <limits_oblobots.scad>)
d_arm=lim(d_arm_minmax[0],arm[0],d_arm_minmax[1]);			// medida del brazo: fondo
h_arm=lim(h_arm_minmax[0],arm[1],h_arm_minmax[1]);			// medida del brazo: ancho

d_hand=lim(d_hand_minmax[0],hand[0],d_hand_minmax[1]);
h_hand=lim(h_hand_minmax[0],hand[1],h_arm-0.5);
angle_hand=lim(angle_hand_minmax[0],hand[2]/2,angle_hand_minmax[1]);			//max(0,min(180,hand[2]/2));

l_arm=lim(d_arm+d_hand,arm[2],l_arm_minmax[1]);			// medida del brazo: longitud

// variables condicionadas a los valores de entrada
d_i_hand=d_hand/2;
d2_arm=d_arm-h_arm;
wrist=d_hand/3;
h_i_arm=h_arm/2;
l_i_arm=l_arm-d_arm/2-d_hand/2;

$fn=50;

// Volumen 
union(){
	difference(){
		union(){
			// brazo
			hull(){
				translate([0,0,h_arm-h_i_arm])
					cylinder(r=d_arm/2,h=h_i_arm);
				translate([0,0,0])
					cylinder(r=d2_arm/2,h=h_arm-h_i_arm);
				translate([l_i_arm-d_hand/2+wrist/2,0,0])
					cylinder(r=wrist/2,h=h_hand-1.5);
				}
			// mano
			translate([l_i_arm,0,0])
				cylinder(r1=d_hand/2,r2=(d_hand/2)*1,h=h_hand);
			}
			// hueco de la mano
			translate([l_i_arm,0,0])
				cylinder(r=d_i_hand/2,h=h_arm*2+2,center=true);
			// Garra
			for(i=[0,1]){
				mirror([0,i,0])		
					difference(){
						translate([l_i_arm,-0.01,-2])
							cube([d_hand,d_hand,2*h_arm-2]);
						translate([l_i_arm,0,-2])
							rotate([0,0,angle_hand])
								cube([d_hand,d_hand,2*h_arm-2]);
						}
				}
		}

	if(hand[2]>=180){
		for(i=[0,1]){
			mirror([0,i,0])
				translate([l_i_arm+d_hand/4,3*(d_hand-d_i_hand)/4,h_hand/2])
					cube([d_hand/2,(d_hand-d_i_hand)/2,h_hand],center=true);
			}
		}
	}
}

// -------------- Fin del módulo arm_cylindrical () -----------------------
// ------------------------------------------------------------------------


////////////////////////////////////////////////////////////////////////
/////////////////// MODULO arm_quadrangle()  ///////////////////////////

module arm_quadrangle (	arm=[10,15,70],		// [ grosor(x), fondo(y), longitud(z) ] Medidas de los Brazo
						hand=[20,5,8]
						){

x_arm=lim(x_arm_minmax[0],arm[1],x_arm_minmax[1]);					// medida del brazo: grosor
y_arm=lim(y_arm_minmax[0],arm[0],y_arm_minmax[1]);					// medida del brazo: fondo

d_hand=lim(d_hand_minmax[0],hand[0],d_hand_minmax[1]);
h_hand=lim(h_hand_minmax[0],hand[1],x_arm-0.5);
n_hand=lim(n_hand_minmax[0],2*floor(hand[2]/2),n_hand_minmax[1]);	// [4,6,8,10,12] nº de lados del polígono de la mano

z_arm=lim(y_arm+5+d_hand,arm[2],z_arm_minmax[1]);					// medida del brazo: longitud



//side=2*tan(180/tn)*td/2;		// medida del lado

wrist=2*(d_hand/2)*tan(180/max(6,n_hand));
h_wrist=h_hand-1;
z_i_arm=z_arm-(y_arm/2)-d_hand-(wrist/2);

translate([0,0,x_arm])
mirror([0,0,1])
union(){
	difference(){
		hull(){
			translate([0,0,x_arm/2])
				cube([y_arm,y_arm,x_arm],center=true);
			translate([z_i_arm,0,x_arm-h_wrist/2])
				cube([wrist,wrist,h_wrist],center=true);
			}
		// rebaje del hombro / forma poligonal
		//translate([0,0,x_arm/2+2])
			//prism_circumscribed (n=n_hand,d=2*y_arm/4,h=x_arm/2);
		}
	// Mano
	difference(){
		translate([z_i_arm+wrist/2+d_hand/2,0,x_arm-h_hand])
			prism_circumscribed (n=n_hand,d=d_hand,h=h_hand);
		translate([z_i_arm+wrist/2+d_hand/2,0,0])
			prism_circumscribed (n=n_hand,d=d_hand/2,h=x_arm*2);
		translate([z_i_arm+wrist/2+3*d_hand/4,0,x_arm])
			cube([d_hand/2+1,d_hand/3,2*x_arm],center=true);
		}
	}
}

// -------------- Fin del módulo arm_quadrangle() -------------------------------
// ------------------------------------------------------------------------------



/////////////////////////////////////////////////////////////////////////
/////////////////// Ejemplos de aplicación //////////////////////////////

i=20;

translate([0,-i,0])
	arm_cylindrical(	arm=[20,8,70],hand=[25,6,65]);

translate([0,i,0])
	arm_quadrangle(arm=[22,6,70],hand=[32,5,4]);
